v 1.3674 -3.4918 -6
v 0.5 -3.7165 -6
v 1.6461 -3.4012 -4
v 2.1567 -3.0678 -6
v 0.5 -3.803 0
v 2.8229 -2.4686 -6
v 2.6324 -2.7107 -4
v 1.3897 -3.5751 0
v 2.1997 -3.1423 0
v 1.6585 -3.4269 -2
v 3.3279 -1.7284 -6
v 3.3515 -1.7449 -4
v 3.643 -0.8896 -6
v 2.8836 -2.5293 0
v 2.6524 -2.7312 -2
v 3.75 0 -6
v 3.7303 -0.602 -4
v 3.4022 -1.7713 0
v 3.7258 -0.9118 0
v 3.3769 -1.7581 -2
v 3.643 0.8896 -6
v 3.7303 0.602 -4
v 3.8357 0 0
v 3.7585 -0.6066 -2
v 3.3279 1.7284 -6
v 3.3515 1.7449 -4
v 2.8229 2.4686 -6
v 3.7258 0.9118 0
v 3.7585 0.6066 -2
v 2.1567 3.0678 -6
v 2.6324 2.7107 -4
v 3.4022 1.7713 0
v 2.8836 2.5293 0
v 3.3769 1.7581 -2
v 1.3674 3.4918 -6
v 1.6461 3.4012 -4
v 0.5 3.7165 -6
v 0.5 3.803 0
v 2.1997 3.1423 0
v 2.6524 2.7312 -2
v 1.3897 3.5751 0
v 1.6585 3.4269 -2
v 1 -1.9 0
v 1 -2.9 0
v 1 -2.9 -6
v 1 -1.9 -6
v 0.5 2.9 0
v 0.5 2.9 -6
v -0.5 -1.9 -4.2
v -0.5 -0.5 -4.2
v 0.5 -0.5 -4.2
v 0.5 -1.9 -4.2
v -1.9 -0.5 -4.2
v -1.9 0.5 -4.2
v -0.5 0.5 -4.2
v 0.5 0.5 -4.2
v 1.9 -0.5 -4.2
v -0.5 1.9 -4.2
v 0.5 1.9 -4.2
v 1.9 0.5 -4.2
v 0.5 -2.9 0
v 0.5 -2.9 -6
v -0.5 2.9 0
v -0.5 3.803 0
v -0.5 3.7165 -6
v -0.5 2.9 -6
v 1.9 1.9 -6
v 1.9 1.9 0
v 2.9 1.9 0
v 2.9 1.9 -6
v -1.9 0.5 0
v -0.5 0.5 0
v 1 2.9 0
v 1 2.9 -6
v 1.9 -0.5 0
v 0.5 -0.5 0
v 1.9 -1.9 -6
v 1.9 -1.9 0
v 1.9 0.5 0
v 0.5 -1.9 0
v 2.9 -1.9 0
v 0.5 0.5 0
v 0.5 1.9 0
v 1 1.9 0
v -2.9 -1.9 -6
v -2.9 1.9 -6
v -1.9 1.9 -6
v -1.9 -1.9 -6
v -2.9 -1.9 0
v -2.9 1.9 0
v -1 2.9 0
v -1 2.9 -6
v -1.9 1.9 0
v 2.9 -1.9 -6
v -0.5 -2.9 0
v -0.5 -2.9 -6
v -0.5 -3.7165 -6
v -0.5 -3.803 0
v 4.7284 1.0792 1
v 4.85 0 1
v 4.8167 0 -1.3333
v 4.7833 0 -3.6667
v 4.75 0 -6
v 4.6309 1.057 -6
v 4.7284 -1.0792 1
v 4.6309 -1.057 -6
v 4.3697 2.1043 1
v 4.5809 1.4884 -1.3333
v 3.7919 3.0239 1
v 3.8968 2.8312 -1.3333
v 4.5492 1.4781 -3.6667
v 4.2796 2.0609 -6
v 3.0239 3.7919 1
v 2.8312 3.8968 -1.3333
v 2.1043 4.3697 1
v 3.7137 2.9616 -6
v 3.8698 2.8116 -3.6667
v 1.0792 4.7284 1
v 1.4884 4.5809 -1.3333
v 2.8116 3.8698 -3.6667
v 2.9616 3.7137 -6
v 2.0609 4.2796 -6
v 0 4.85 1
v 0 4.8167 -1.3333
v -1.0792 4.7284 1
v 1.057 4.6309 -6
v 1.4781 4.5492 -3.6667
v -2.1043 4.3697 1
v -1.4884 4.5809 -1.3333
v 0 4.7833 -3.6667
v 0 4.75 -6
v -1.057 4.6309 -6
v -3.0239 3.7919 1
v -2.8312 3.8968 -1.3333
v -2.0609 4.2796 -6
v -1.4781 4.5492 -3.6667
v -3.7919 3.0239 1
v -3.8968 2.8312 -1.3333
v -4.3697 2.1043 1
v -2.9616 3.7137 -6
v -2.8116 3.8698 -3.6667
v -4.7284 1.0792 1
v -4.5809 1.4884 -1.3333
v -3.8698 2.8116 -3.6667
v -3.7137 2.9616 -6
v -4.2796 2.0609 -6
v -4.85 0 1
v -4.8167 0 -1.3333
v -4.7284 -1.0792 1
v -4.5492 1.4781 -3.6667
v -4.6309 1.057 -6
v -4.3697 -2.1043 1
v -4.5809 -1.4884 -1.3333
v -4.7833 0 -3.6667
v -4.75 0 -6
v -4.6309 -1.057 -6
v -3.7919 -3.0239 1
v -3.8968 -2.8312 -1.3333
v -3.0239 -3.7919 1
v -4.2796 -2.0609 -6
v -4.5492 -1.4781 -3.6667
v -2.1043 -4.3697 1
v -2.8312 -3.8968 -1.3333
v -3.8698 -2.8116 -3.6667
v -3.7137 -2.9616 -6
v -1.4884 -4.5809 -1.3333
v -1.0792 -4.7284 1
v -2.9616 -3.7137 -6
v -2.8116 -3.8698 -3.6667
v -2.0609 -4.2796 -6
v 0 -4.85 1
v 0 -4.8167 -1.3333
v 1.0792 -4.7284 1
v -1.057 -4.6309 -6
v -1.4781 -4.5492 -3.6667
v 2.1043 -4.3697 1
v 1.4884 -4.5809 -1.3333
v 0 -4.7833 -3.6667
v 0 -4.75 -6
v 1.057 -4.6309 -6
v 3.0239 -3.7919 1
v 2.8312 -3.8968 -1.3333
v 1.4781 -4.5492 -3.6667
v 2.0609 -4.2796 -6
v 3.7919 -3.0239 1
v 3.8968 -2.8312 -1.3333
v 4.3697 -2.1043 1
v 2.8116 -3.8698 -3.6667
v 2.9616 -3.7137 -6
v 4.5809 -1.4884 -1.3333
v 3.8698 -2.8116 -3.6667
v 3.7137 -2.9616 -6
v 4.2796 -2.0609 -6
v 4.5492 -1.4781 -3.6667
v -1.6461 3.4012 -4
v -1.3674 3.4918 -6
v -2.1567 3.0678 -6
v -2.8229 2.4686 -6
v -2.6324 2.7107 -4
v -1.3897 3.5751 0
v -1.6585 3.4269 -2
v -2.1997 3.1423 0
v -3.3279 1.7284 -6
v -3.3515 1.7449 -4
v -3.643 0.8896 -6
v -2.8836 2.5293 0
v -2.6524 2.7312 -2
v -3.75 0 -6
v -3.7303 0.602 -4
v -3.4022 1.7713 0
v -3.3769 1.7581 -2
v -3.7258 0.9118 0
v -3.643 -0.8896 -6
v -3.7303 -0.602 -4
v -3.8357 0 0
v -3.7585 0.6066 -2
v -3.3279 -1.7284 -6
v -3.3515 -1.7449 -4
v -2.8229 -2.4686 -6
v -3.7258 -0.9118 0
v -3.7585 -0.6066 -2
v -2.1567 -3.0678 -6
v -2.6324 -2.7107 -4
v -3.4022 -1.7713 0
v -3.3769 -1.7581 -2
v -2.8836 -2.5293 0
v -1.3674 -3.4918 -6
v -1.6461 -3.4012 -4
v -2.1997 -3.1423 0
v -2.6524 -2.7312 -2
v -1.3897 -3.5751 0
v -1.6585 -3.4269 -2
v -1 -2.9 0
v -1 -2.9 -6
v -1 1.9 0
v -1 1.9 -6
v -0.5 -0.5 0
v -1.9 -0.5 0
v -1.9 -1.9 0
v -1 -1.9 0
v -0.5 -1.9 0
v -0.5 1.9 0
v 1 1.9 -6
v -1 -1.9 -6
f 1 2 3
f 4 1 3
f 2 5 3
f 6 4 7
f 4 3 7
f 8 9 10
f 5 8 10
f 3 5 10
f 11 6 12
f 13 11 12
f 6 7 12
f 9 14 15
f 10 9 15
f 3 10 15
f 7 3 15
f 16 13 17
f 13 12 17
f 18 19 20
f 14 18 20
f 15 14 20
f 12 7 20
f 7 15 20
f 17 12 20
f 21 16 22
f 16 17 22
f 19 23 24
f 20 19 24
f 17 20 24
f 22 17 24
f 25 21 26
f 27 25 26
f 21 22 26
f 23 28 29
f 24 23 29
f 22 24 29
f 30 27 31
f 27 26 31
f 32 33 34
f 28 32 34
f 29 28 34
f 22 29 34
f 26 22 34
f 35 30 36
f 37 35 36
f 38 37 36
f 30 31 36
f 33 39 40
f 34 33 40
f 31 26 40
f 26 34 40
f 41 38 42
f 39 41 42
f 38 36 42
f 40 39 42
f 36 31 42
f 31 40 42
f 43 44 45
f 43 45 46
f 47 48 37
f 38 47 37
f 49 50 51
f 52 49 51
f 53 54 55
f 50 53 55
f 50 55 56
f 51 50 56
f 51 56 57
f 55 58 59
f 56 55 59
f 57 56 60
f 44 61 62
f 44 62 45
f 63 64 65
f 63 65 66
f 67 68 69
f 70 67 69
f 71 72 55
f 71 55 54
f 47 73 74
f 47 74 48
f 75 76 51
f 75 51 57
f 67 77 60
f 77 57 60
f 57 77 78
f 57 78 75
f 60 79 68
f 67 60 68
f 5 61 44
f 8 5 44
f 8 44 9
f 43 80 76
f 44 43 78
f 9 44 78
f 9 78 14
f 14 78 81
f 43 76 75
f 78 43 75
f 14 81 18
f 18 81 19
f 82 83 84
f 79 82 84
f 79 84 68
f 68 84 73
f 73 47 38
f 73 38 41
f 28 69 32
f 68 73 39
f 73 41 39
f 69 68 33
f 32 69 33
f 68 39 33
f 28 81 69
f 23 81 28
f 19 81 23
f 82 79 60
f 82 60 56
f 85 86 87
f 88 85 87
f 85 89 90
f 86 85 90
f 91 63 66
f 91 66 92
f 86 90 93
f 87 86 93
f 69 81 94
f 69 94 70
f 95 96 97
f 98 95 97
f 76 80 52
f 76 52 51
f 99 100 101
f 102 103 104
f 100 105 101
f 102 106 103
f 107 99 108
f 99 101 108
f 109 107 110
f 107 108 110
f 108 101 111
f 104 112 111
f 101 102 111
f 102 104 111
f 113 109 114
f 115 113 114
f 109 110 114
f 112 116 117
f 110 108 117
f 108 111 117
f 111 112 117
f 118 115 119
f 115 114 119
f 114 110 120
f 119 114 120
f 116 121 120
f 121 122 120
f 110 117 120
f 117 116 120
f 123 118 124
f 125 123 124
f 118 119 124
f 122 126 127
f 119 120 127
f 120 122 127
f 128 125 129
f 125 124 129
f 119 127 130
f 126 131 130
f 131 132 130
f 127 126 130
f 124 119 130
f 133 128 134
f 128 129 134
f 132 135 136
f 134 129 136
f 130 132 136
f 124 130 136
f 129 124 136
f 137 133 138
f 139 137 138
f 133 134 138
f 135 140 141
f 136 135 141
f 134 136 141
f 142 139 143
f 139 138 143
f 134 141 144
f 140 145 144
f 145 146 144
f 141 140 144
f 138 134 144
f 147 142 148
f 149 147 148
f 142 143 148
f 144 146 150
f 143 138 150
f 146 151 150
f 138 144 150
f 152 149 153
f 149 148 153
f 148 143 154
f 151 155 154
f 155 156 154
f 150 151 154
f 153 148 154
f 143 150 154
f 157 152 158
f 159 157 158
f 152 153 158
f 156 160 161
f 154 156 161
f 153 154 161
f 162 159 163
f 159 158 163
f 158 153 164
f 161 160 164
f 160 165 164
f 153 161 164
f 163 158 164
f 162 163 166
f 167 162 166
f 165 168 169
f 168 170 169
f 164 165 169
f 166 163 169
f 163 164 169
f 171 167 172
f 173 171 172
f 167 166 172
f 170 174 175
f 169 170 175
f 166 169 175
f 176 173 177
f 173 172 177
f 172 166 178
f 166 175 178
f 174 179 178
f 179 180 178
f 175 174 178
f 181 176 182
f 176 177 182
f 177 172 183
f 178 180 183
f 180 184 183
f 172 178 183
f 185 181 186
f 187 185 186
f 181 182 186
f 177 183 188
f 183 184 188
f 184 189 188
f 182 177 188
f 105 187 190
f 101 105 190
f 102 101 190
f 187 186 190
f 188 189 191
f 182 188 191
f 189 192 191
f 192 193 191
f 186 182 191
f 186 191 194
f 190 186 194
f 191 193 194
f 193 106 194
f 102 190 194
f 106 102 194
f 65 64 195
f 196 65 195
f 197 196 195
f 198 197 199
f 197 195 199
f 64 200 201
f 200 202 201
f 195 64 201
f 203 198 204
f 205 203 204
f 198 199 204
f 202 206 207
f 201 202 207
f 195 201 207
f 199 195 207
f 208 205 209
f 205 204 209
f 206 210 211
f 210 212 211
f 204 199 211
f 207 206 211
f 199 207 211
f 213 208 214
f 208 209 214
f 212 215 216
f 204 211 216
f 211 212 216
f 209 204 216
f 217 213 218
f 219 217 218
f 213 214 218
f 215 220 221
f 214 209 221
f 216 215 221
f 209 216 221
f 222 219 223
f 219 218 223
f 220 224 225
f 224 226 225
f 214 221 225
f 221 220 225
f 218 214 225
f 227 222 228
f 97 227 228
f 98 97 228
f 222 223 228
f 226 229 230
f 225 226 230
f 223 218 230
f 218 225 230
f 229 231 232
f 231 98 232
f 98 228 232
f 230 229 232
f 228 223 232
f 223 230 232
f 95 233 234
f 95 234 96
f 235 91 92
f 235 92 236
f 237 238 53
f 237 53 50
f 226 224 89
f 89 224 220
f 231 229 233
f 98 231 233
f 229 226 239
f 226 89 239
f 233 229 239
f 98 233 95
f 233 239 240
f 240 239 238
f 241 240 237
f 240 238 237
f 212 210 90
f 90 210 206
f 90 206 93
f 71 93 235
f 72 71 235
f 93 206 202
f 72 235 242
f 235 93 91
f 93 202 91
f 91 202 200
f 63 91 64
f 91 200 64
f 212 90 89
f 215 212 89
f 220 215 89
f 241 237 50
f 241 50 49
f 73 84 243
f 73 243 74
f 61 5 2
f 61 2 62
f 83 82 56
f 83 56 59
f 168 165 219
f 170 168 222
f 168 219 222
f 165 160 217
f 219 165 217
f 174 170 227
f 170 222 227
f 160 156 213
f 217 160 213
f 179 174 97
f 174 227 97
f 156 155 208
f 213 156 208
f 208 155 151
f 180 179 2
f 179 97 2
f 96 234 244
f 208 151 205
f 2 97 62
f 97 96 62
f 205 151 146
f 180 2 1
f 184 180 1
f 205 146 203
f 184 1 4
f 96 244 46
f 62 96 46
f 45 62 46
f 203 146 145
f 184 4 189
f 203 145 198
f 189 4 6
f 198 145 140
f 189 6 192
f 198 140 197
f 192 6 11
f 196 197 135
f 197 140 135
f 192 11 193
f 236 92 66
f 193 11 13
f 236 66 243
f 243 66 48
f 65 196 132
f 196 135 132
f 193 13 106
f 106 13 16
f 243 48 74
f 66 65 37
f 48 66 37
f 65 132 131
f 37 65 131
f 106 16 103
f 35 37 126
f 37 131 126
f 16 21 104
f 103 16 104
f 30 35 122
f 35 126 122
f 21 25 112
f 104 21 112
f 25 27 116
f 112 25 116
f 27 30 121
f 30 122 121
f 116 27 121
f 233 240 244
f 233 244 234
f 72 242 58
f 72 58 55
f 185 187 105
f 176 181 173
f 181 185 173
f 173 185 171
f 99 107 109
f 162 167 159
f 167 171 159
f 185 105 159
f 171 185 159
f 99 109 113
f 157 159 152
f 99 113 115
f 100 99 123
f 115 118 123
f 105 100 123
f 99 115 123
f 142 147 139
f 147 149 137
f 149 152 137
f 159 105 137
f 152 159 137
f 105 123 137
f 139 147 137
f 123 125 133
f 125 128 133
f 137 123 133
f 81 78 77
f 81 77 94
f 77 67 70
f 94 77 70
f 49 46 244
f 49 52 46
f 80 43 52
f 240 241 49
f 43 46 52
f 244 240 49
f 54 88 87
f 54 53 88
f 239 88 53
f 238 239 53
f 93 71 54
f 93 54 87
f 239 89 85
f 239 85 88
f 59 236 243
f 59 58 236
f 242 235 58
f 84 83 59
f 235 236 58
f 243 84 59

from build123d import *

# Parameters (mm, degrees)
SKETCH001_W  = 1
SKETCH001_H  = 3.8
PAD_DEPTH    = 6
PAD001_DEPTH = 4.2


with BuildPart() as part:
    # Sketch → Revolution (revolve)
    with BuildSketch(Plane.XZ):
        Polygon((0, 1), (4.85, 1), (4.75, -6), (3.75, -6), (3.835714, 0), (0, 0), align=None)
    revolve(axis=Axis((0, 0, 0), (0, 0, 1)))

    # Sketch001 → Pad (new body)
    with BuildSketch(Plane.XY):
        Polygon((-1, -1.9), (-1, -2.9), (-0.5, -2.9), (-0.5, -4.35), (0.5, -4.35), (0.5, -2.9), (1, -2.9), (1, -1.9), align=None)
        Polygon((-1, 2.9), (-1, 1.9), (1, 1.9), (1, 2.9), (0.5, 2.9), (0.5, 4.35), (-0.5, 4.35), (-0.5, 2.9), align=None)
        with Locations((2.4, 0)):
            Rectangle(SKETCH001_W, SKETCH001_H)
        with Locations((-2.4, 0)):
            Rectangle(SKETCH001_W, SKETCH001_H)
    extrude(amount=-PAD_DEPTH)

    # Sketch002 → Pad001 (join)
    with BuildSketch(Plane.XY):
        Polygon((-0.5, 2.5), (-0.5, 0.5), (-2.5, 0.5), (-2.5, -0.5), (-0.5, -0.5), (-0.5, -2.5), (0.5, -2.5), (0.5, -0.5), (2.5, -0.5), (2.5, 0.5), (0.5, 0.5), (0.5, 2.5), align=None)
    extrude(amount=-PAD001_DEPTH)


solid = part.part
